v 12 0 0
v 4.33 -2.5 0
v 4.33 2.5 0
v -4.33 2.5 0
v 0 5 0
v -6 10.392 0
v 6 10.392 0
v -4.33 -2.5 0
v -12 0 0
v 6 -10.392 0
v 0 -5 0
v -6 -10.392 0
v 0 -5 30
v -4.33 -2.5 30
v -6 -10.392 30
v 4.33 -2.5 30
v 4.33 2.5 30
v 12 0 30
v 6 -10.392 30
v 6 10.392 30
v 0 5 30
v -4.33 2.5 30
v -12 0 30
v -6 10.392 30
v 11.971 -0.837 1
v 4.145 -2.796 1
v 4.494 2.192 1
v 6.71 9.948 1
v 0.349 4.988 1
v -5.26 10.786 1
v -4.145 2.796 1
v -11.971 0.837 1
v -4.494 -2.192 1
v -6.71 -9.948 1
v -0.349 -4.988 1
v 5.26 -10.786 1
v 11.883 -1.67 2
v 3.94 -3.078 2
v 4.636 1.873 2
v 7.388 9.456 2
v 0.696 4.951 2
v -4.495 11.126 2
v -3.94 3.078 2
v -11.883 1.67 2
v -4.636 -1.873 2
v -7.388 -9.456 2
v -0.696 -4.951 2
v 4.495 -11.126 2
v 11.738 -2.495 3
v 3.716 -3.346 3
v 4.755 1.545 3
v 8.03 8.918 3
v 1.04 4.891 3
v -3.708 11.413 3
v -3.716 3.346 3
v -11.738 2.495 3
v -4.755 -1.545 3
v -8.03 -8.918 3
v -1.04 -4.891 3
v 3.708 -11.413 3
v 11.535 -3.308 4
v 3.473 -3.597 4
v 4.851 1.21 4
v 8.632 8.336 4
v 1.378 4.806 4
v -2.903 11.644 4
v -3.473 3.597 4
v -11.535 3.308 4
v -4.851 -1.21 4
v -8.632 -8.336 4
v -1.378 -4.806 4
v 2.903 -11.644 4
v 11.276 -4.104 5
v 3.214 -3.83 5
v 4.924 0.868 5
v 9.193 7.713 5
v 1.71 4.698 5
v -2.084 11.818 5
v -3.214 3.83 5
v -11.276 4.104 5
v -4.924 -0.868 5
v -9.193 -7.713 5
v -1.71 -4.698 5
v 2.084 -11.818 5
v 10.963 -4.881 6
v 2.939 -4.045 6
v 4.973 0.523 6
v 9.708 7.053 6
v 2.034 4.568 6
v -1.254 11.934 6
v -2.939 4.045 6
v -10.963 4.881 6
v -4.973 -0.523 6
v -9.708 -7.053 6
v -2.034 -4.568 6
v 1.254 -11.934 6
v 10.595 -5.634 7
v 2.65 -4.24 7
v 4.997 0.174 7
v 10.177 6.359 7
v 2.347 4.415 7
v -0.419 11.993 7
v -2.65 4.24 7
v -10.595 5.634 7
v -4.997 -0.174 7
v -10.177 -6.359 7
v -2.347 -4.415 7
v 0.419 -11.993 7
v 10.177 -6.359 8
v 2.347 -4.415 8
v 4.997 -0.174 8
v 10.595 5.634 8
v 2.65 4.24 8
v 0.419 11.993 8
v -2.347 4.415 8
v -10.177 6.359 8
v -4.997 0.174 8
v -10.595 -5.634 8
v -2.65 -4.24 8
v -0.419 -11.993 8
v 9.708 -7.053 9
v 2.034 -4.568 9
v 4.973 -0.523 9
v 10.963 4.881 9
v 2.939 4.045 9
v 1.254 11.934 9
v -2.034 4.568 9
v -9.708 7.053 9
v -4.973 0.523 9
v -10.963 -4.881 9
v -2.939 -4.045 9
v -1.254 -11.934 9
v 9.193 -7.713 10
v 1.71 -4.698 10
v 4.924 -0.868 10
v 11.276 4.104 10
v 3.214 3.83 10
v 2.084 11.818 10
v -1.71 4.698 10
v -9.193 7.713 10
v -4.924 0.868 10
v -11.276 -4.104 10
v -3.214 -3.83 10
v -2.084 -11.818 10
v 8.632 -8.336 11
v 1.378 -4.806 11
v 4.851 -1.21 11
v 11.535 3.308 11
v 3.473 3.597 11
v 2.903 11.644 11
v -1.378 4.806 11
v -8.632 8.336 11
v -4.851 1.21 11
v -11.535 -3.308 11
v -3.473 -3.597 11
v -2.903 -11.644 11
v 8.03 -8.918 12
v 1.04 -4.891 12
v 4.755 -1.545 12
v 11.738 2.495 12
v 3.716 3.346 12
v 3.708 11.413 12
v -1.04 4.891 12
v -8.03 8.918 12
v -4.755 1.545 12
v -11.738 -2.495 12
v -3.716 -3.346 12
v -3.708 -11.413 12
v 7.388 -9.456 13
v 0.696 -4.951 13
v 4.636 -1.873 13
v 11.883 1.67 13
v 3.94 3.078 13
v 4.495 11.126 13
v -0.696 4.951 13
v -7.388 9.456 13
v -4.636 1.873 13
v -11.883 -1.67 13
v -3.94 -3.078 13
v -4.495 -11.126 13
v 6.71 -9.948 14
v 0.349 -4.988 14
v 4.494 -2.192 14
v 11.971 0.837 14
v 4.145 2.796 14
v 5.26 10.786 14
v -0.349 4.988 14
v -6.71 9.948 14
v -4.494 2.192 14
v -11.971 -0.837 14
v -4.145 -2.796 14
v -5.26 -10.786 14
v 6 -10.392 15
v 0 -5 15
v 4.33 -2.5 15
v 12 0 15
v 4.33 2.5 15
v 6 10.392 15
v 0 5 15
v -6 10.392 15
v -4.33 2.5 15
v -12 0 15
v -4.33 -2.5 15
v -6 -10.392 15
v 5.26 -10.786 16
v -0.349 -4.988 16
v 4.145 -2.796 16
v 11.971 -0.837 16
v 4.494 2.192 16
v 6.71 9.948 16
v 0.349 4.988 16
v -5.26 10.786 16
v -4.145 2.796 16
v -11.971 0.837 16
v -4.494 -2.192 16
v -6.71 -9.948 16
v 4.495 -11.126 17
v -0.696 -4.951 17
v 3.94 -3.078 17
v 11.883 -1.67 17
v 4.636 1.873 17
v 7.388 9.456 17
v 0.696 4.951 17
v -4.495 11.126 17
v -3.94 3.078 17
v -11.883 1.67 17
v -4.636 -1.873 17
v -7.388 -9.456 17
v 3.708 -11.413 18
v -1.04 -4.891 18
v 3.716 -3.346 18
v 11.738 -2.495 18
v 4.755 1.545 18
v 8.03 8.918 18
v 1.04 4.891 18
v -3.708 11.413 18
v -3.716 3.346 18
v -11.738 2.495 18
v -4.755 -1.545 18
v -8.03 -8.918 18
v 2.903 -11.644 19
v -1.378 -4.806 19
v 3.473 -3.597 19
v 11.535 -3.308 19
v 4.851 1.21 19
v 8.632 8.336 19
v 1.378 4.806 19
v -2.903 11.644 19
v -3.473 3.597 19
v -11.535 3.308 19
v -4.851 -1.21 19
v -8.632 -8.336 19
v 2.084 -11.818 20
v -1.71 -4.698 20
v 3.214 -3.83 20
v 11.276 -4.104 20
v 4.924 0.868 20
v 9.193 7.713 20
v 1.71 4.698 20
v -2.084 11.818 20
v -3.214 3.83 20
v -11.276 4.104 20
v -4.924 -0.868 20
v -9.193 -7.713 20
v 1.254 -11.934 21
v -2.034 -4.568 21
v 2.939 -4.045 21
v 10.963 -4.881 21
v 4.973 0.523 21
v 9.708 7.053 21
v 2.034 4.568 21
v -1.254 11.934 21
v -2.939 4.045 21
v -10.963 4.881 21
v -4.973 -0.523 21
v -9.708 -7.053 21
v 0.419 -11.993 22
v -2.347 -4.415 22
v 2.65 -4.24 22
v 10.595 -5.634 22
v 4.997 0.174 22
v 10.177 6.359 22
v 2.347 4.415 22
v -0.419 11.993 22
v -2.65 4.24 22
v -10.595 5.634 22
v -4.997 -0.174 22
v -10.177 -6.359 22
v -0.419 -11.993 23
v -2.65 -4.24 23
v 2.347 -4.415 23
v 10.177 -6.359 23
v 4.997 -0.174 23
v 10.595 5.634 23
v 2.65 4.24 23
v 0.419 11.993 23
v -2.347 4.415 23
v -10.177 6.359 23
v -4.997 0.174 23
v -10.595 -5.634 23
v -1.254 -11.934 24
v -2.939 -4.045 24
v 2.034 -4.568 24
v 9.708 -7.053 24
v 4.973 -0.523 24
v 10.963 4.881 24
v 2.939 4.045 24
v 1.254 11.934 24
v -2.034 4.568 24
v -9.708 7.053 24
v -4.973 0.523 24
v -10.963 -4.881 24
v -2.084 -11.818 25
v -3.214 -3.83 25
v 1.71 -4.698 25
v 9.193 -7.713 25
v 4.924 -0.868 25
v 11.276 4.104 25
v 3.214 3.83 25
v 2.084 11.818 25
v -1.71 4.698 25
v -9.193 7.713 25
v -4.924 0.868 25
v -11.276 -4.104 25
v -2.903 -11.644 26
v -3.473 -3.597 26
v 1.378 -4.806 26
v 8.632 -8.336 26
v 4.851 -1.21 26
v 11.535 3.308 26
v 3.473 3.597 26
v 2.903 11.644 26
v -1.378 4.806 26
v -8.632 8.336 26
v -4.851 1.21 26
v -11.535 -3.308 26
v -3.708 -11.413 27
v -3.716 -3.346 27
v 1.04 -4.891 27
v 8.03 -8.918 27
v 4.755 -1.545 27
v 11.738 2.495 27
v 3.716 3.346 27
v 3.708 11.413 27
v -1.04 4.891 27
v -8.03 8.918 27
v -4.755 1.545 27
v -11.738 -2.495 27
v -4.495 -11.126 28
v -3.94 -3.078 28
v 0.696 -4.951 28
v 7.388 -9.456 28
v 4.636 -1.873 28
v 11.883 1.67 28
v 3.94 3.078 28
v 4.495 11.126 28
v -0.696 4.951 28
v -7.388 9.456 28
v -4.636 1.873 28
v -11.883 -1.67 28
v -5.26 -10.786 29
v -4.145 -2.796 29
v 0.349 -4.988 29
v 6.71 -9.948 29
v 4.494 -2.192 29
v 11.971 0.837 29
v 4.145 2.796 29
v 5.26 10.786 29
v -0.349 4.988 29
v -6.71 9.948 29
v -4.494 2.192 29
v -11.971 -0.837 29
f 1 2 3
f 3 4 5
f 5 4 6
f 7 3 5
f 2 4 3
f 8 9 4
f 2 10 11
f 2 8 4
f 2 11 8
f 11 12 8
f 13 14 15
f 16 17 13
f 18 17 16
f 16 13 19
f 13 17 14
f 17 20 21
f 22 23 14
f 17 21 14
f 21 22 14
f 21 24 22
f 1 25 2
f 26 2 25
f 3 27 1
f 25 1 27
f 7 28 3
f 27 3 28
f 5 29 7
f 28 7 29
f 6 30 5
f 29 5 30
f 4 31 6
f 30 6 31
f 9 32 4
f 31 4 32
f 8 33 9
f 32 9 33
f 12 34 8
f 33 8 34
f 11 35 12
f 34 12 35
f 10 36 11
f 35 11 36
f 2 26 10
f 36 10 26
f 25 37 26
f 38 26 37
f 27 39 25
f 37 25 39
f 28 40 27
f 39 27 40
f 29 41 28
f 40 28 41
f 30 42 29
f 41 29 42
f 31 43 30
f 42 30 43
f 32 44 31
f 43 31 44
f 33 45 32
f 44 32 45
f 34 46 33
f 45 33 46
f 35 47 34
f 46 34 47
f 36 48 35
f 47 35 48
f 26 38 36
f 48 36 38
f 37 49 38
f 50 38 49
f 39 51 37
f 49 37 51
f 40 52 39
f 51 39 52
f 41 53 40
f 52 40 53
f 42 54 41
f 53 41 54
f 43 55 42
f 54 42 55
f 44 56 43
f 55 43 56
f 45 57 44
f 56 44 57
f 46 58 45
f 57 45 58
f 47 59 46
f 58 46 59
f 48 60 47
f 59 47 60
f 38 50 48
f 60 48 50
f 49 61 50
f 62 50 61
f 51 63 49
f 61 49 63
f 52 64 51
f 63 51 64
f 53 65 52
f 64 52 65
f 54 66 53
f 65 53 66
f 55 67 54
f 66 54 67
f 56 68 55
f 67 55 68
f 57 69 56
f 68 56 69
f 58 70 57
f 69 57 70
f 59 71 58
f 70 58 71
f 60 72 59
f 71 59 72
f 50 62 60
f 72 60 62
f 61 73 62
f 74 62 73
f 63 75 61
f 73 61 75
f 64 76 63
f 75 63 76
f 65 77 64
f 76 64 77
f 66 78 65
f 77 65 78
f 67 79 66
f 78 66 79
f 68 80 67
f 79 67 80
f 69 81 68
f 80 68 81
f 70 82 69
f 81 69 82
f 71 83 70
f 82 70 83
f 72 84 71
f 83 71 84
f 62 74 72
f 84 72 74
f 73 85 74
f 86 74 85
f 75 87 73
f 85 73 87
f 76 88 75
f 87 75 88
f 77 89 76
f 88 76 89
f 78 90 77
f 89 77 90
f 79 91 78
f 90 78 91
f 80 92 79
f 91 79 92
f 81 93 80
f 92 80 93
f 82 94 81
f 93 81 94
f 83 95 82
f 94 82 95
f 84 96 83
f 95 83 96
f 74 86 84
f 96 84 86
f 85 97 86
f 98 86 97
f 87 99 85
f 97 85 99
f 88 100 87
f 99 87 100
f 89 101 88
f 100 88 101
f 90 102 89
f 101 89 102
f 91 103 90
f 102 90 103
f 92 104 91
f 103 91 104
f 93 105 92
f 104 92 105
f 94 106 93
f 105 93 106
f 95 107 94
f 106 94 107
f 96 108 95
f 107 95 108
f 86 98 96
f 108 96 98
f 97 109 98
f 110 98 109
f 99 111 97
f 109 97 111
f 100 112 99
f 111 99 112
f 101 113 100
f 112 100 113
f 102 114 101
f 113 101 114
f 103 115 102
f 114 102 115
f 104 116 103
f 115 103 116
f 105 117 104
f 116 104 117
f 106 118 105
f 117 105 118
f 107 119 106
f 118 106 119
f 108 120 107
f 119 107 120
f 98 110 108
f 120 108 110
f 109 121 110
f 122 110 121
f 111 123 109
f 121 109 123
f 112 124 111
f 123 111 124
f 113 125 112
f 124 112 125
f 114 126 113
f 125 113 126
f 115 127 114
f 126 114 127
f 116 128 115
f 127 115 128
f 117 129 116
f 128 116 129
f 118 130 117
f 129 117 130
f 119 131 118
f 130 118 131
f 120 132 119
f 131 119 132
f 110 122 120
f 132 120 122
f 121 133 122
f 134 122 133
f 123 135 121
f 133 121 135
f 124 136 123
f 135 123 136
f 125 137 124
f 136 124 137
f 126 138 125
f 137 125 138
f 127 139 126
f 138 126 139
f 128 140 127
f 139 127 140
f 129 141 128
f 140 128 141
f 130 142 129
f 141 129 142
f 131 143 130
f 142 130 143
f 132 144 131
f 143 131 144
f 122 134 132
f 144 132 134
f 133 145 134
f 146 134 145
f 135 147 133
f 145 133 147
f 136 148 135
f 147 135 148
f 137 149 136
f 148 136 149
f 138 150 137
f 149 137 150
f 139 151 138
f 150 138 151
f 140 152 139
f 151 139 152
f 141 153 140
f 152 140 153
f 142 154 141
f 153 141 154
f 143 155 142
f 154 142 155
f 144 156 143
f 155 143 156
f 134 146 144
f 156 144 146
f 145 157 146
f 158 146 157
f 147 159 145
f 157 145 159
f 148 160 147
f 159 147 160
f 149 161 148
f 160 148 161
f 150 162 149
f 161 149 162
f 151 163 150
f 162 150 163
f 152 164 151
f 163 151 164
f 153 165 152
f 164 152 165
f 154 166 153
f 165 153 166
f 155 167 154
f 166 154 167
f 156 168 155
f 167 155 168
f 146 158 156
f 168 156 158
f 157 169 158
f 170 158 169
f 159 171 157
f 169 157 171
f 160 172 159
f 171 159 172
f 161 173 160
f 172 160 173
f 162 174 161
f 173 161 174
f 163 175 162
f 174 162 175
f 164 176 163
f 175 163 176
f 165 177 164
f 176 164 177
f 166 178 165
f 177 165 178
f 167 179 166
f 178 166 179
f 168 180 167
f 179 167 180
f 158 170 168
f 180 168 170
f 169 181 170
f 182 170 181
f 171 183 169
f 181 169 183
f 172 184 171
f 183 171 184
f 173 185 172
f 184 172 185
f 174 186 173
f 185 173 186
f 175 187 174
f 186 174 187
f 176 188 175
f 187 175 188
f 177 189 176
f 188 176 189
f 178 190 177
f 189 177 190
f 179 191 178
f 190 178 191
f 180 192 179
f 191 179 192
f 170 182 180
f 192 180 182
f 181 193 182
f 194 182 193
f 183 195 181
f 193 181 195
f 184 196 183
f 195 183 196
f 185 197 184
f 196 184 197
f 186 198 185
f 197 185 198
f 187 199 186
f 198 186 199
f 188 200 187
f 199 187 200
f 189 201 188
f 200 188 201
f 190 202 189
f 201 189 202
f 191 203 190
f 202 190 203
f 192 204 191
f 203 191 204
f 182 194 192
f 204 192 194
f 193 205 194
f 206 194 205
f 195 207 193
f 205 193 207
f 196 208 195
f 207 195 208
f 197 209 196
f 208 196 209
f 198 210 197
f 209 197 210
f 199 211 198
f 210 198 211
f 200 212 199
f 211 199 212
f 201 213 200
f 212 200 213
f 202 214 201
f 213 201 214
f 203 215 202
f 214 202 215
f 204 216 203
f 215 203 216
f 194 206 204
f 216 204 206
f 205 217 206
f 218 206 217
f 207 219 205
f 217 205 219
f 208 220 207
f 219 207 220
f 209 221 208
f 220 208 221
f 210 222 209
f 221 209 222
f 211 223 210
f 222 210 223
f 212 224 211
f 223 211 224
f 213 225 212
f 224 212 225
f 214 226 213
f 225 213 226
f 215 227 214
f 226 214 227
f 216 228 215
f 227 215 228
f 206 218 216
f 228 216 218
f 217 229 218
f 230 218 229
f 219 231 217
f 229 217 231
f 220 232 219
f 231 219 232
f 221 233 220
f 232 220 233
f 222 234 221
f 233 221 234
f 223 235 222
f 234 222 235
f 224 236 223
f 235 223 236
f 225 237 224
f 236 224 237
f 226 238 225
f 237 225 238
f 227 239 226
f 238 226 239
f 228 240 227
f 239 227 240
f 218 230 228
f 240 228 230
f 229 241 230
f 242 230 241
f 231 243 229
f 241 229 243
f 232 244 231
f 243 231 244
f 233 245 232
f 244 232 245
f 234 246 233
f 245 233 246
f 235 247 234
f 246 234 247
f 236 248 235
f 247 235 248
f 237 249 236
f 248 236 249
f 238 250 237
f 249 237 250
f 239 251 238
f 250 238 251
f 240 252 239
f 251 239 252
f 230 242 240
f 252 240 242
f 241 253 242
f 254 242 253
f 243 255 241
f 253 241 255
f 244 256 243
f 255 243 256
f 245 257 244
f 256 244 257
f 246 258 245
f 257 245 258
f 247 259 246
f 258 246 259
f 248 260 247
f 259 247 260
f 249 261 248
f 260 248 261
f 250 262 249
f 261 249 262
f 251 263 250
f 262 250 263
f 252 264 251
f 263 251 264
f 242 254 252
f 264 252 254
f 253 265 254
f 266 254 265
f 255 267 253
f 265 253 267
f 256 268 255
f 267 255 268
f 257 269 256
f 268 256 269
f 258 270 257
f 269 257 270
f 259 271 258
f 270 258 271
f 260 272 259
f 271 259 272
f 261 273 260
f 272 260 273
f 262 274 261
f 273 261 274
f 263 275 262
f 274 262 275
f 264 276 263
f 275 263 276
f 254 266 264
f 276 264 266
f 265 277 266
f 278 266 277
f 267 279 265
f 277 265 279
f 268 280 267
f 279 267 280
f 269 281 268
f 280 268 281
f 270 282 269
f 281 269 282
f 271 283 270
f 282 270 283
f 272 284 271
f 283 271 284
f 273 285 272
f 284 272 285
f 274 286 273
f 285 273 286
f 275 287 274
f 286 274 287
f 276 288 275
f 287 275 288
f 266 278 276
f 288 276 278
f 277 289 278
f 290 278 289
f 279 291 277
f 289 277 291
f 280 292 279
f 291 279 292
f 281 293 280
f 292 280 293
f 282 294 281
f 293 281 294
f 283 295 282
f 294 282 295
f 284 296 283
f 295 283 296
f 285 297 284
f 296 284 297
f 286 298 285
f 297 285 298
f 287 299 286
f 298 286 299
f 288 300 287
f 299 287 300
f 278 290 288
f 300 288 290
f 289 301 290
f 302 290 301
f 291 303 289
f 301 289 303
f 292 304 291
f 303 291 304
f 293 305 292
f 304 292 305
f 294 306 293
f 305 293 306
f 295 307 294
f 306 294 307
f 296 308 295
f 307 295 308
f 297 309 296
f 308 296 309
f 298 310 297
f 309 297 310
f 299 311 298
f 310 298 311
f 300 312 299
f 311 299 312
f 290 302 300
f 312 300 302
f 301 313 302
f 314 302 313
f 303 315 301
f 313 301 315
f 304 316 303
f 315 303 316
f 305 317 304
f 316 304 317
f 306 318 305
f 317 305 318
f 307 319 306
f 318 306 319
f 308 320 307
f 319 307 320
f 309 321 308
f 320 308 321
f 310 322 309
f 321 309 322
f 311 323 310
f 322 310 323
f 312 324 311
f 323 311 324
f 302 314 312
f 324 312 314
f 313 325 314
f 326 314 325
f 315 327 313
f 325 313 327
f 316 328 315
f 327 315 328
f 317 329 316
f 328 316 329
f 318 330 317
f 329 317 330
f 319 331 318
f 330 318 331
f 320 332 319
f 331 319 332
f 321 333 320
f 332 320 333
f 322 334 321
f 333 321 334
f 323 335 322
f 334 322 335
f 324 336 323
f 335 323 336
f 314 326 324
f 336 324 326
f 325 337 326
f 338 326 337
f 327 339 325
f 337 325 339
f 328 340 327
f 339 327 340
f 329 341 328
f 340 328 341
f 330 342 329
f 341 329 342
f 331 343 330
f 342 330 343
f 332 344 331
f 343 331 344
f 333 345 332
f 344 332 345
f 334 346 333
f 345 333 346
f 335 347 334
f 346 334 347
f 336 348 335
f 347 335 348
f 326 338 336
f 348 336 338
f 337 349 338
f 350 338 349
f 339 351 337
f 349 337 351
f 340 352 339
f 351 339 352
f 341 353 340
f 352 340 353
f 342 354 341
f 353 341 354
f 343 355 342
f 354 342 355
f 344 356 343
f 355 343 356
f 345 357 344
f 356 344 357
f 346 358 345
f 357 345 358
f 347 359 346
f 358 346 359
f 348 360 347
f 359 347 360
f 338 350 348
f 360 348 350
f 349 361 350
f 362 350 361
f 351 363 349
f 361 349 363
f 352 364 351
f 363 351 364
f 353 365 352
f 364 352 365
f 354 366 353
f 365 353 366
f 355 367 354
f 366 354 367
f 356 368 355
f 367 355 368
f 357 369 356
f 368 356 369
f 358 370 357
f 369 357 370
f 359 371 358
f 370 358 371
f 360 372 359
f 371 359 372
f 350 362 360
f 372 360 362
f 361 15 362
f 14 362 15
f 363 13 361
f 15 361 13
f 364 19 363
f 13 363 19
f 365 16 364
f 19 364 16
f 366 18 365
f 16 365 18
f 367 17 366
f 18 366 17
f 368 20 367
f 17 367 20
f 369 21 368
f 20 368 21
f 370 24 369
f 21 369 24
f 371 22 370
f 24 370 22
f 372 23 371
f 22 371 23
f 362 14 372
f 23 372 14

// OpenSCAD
// OpenSCAD: twisted column via linear_extrude
// Shows a parametric modeling idiom — loop + boolean + extrude with twist.

$fn = 32;

module star(outer=10, inner=4, points=5) {
  poly = [for (i = [0 : 2*points-1])
    let (r = (i % 2 == 0) ? outer : inner,
         a = i * 180 / points)
    [r * cos(a), r * sin(a)]];
  polygon(poly);
}

linear_extrude(height=30, twist=120, slices=30, convexity=4)
  star(outer=12, inner=5, points=6);
